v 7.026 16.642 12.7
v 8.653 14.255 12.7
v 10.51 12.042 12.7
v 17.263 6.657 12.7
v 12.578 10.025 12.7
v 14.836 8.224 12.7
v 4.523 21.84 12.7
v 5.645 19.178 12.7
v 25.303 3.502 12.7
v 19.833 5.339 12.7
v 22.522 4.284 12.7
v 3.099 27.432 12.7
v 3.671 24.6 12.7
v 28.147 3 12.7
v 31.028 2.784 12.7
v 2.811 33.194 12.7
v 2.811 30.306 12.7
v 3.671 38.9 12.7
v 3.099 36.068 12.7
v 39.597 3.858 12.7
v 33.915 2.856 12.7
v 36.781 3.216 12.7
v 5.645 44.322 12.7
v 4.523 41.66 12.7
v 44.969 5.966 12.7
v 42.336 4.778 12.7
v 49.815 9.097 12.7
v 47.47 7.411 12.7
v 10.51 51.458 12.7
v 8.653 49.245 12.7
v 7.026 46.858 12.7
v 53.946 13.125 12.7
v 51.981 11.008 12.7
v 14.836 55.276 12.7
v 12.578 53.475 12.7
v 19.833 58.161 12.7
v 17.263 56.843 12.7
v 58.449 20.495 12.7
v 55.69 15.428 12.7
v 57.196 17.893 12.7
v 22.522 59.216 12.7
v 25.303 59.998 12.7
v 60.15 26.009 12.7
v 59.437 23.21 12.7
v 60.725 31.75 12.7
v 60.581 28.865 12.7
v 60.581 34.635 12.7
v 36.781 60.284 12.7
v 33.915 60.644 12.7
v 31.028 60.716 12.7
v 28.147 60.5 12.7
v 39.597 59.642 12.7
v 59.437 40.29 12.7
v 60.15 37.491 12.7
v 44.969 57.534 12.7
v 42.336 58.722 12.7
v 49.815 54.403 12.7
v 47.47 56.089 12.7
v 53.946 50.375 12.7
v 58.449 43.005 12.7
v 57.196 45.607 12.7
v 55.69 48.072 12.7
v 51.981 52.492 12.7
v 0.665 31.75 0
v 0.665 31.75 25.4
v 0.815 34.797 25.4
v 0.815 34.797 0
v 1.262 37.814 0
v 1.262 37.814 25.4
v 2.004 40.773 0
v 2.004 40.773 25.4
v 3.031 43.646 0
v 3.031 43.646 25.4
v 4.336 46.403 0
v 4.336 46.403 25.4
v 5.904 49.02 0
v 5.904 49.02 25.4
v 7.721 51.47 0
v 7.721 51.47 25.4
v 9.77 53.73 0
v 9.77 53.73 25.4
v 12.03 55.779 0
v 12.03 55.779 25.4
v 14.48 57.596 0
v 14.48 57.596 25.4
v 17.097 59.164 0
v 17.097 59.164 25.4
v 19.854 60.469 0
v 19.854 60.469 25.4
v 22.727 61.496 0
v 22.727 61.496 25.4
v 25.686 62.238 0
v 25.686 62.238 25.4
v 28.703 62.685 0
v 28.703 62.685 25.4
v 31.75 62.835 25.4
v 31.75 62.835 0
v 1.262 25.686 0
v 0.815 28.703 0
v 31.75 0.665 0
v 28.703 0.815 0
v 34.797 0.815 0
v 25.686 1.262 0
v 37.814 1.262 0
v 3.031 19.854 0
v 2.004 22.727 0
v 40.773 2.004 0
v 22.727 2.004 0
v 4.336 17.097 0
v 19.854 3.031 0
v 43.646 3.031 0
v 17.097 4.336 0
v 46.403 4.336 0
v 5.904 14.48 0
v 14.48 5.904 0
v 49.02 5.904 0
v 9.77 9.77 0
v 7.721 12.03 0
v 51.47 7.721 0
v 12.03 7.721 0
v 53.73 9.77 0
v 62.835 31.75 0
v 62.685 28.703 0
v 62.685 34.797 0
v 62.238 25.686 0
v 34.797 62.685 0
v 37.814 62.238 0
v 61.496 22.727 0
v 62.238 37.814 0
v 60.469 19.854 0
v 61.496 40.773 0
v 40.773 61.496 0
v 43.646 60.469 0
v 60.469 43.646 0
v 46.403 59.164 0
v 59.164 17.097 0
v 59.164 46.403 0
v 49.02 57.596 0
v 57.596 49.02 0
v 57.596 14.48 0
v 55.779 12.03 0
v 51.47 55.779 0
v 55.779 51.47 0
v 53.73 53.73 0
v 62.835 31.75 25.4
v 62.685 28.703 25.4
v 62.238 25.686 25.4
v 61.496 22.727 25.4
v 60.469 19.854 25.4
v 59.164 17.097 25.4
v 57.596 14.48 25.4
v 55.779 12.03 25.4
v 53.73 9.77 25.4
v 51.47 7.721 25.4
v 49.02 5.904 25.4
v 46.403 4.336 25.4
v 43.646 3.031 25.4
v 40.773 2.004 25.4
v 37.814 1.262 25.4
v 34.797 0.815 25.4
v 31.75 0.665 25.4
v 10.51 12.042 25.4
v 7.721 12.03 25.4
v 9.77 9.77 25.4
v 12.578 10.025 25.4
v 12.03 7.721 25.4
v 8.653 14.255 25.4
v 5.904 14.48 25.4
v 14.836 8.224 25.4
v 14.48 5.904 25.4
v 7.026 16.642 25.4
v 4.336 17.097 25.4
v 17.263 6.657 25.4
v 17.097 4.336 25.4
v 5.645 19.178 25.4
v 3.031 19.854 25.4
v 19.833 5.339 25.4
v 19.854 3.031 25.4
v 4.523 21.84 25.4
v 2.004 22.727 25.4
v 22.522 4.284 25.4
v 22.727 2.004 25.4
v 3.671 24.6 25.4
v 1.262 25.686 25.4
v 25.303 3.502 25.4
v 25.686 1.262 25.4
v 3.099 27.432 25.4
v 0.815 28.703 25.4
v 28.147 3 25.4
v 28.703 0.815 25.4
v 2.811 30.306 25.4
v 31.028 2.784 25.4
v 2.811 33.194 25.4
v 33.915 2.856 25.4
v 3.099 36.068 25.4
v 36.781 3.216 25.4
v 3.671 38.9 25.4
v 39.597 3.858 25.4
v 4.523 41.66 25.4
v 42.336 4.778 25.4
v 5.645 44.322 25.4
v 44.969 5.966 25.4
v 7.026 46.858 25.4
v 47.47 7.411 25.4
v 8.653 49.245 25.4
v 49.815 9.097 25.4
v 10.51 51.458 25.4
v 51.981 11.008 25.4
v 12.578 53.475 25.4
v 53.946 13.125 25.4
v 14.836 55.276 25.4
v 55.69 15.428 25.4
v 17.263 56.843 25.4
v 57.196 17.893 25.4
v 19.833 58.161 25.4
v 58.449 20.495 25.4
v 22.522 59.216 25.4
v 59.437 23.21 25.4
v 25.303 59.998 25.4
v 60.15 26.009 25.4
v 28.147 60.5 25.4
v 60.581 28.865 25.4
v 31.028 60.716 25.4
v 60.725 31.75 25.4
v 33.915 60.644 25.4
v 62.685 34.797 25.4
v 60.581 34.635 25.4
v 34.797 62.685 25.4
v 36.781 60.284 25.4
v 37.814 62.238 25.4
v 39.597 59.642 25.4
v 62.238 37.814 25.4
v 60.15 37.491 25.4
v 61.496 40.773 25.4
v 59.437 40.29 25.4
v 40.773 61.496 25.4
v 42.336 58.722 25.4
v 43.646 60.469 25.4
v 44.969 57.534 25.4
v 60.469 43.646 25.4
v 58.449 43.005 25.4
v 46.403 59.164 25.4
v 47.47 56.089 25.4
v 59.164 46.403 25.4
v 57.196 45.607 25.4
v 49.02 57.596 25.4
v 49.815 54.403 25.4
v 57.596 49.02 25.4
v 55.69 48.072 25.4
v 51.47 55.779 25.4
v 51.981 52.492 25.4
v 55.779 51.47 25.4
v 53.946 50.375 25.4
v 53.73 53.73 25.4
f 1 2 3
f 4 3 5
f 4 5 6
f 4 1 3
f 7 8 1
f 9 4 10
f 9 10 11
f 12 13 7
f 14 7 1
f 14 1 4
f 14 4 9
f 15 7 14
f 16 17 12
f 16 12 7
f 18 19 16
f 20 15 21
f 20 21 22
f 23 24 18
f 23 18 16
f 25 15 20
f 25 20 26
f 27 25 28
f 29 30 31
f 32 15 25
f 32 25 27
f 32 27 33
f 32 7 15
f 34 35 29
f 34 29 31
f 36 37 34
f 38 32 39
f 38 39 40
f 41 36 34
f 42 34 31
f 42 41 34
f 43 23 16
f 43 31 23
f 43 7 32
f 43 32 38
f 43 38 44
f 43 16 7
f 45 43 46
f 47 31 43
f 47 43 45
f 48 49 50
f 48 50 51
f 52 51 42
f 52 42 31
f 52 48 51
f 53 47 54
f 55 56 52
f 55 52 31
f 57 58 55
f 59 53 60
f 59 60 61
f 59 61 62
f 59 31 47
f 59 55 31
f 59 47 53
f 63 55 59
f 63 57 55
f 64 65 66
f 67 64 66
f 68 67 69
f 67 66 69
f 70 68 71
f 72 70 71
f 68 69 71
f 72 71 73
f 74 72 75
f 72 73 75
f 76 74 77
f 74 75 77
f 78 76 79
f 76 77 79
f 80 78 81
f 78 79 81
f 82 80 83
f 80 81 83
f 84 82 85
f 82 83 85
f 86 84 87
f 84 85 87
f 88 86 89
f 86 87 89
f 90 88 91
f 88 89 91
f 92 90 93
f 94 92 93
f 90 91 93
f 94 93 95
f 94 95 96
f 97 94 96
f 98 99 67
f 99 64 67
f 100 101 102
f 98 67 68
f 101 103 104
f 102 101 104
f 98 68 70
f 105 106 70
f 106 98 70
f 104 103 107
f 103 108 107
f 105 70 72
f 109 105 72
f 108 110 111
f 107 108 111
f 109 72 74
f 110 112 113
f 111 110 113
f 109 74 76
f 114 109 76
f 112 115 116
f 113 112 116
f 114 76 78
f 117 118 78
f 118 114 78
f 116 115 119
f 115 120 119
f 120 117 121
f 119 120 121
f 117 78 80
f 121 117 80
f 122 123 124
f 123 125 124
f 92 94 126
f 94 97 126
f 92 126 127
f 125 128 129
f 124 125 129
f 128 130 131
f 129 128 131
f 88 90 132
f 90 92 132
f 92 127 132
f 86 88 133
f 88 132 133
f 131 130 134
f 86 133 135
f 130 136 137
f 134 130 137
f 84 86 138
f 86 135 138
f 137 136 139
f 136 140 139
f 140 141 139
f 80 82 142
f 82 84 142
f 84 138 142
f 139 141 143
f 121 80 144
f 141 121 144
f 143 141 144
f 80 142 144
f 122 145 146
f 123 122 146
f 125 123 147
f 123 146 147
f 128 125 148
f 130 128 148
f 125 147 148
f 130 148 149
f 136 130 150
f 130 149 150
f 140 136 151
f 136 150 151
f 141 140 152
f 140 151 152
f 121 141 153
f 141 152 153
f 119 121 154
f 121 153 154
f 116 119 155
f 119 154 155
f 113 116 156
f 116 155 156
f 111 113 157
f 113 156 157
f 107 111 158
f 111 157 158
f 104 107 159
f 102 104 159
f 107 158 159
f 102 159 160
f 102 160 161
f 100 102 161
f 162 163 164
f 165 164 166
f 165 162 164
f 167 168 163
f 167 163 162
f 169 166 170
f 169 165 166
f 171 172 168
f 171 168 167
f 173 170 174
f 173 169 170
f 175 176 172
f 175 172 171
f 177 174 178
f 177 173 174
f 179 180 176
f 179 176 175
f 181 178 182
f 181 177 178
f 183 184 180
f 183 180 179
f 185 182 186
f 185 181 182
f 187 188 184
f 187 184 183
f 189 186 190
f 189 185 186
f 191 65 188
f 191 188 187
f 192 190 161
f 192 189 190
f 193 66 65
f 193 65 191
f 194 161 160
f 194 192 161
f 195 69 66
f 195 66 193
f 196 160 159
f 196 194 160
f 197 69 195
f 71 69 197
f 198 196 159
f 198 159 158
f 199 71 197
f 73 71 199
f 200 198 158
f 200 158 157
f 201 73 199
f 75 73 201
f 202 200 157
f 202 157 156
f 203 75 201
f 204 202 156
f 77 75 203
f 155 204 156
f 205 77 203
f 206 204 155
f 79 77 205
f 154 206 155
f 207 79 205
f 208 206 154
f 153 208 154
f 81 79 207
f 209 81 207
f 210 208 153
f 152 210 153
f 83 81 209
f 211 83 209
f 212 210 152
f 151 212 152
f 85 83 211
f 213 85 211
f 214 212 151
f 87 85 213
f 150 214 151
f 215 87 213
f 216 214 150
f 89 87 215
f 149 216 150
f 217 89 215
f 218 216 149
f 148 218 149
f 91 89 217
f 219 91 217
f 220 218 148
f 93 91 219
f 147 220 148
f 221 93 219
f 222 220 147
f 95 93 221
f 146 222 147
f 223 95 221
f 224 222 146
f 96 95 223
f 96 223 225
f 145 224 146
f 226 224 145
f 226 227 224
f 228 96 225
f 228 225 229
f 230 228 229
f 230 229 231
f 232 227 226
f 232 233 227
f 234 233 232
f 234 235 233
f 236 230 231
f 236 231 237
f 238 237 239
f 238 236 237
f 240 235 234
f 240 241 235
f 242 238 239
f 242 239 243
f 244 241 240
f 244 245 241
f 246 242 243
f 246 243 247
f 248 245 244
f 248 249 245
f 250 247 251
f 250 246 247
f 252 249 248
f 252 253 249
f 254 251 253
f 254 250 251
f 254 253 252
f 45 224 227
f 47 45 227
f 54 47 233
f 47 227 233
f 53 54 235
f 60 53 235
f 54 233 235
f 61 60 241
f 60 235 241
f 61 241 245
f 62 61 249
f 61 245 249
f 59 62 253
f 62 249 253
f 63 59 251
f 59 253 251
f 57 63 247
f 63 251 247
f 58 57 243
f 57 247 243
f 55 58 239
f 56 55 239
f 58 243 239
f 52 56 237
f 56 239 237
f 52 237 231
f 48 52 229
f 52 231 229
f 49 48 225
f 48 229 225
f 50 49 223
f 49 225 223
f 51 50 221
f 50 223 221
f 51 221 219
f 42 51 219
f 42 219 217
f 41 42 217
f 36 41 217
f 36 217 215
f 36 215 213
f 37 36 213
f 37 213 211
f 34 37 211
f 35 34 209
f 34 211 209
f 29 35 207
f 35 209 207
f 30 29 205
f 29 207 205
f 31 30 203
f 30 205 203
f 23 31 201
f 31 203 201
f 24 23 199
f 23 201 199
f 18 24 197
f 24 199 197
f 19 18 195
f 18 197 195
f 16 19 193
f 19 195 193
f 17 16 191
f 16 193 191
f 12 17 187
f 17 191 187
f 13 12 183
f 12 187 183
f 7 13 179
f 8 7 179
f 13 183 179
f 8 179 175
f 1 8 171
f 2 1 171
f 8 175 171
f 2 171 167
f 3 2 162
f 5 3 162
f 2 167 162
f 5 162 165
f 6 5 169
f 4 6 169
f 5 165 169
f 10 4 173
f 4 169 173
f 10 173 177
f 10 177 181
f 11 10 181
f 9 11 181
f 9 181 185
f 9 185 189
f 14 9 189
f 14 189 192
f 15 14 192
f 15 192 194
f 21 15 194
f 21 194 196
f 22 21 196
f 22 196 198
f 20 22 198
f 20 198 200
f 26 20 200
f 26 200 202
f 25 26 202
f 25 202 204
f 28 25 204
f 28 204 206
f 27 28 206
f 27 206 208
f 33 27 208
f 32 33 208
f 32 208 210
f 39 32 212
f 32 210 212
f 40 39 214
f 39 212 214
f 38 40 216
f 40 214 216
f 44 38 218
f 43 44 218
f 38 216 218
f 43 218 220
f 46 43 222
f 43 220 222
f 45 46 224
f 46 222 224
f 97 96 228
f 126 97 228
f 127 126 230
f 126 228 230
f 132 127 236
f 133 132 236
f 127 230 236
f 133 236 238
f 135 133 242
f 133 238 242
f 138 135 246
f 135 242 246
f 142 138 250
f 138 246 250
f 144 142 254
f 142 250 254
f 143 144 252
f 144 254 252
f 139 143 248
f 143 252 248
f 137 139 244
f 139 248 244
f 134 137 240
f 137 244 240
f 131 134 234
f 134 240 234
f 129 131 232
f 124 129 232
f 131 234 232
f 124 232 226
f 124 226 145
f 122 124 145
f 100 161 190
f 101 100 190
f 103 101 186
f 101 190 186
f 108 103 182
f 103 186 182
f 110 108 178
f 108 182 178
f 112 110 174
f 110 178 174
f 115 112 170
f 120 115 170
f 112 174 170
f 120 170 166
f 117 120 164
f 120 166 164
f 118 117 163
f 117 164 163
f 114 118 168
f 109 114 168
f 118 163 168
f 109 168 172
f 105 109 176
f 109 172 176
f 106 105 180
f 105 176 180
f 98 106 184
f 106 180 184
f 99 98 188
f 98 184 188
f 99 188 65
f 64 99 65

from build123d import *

# Parameters (mm, degrees)
F0_W     = 63.5
F0_H     = 63.5
F1_DEPTH = 25.4
F3_DEPTH = 25.4
F4_R     = 28.974598
F5_DEPTH = 12.7


with BuildPart() as f1:
    # F0 (on Top) → F1 (new body)
    with BuildSketch(Plane.XY):
        with Locations((31.75, 31.75)):
            Rectangle(F0_W, F0_H)
    extrude(amount=F1_DEPTH)

    # F2 (on face) → F3 (cut)
    with BuildSketch(Plane.XY.offset(25.4)):
        with BuildLine():
            Line((31.75, 62.834862), (31.75, 63.5))
            Line((31.75, 63.5), (0, 63.5))
            Line((0, 63.5), (0, 31.75))
            Line((0, 31.75), (0.665138, 31.75))
            ThreePointArc((0.665138, 31.75), (9.769684, 53.730316), (31.75, 62.834862))
        make_face()
        with BuildLine():
            Line((63.5, 63.5), (31.75, 63.5))
            Line((31.75, 63.5), (31.75, 62.834862))
            ThreePointArc((31.75, 62.834862), (53.730316, 53.730316), (62.834862, 31.75))
            Line((62.834862, 31.75), (63.5, 31.75))
            Line((63.5, 31.75), (63.5, 63.5))
        make_face()
        with BuildLine():
            Line((63.5, 31.75), (62.834862, 31.75))
            ThreePointArc((62.834862, 31.75), (53.730316, 9.769684), (31.75, 0.665138))
            Line((31.75, 0.665138), (31.75, 0))
            Line((31.75, 0), (63.5, 0))
            Line((63.5, 0), (63.5, 31.75))
        make_face()
        with BuildLine():
            ThreePointArc((31.75, 0.665138), (9.769684, 9.769684), (0.665138, 31.75))
            Line((0.665138, 31.75), (0, 31.75))
            Line((0, 31.75), (0, 0))
            Line((0, 0), (31.75, 0))
            Line((31.75, 0), (31.75, 0.665138))
        make_face()
    extrude(amount=-F3_DEPTH, mode=Mode.SUBTRACT)

    # F4 (on face) → F5 (cut)
    with BuildSketch(Plane.XY.offset(25.4)):
        with Locations((31.75, 31.75)):
            Circle(F4_R)
    extrude(amount=-F5_DEPTH, mode=Mode.SUBTRACT)


solid = f1.part
